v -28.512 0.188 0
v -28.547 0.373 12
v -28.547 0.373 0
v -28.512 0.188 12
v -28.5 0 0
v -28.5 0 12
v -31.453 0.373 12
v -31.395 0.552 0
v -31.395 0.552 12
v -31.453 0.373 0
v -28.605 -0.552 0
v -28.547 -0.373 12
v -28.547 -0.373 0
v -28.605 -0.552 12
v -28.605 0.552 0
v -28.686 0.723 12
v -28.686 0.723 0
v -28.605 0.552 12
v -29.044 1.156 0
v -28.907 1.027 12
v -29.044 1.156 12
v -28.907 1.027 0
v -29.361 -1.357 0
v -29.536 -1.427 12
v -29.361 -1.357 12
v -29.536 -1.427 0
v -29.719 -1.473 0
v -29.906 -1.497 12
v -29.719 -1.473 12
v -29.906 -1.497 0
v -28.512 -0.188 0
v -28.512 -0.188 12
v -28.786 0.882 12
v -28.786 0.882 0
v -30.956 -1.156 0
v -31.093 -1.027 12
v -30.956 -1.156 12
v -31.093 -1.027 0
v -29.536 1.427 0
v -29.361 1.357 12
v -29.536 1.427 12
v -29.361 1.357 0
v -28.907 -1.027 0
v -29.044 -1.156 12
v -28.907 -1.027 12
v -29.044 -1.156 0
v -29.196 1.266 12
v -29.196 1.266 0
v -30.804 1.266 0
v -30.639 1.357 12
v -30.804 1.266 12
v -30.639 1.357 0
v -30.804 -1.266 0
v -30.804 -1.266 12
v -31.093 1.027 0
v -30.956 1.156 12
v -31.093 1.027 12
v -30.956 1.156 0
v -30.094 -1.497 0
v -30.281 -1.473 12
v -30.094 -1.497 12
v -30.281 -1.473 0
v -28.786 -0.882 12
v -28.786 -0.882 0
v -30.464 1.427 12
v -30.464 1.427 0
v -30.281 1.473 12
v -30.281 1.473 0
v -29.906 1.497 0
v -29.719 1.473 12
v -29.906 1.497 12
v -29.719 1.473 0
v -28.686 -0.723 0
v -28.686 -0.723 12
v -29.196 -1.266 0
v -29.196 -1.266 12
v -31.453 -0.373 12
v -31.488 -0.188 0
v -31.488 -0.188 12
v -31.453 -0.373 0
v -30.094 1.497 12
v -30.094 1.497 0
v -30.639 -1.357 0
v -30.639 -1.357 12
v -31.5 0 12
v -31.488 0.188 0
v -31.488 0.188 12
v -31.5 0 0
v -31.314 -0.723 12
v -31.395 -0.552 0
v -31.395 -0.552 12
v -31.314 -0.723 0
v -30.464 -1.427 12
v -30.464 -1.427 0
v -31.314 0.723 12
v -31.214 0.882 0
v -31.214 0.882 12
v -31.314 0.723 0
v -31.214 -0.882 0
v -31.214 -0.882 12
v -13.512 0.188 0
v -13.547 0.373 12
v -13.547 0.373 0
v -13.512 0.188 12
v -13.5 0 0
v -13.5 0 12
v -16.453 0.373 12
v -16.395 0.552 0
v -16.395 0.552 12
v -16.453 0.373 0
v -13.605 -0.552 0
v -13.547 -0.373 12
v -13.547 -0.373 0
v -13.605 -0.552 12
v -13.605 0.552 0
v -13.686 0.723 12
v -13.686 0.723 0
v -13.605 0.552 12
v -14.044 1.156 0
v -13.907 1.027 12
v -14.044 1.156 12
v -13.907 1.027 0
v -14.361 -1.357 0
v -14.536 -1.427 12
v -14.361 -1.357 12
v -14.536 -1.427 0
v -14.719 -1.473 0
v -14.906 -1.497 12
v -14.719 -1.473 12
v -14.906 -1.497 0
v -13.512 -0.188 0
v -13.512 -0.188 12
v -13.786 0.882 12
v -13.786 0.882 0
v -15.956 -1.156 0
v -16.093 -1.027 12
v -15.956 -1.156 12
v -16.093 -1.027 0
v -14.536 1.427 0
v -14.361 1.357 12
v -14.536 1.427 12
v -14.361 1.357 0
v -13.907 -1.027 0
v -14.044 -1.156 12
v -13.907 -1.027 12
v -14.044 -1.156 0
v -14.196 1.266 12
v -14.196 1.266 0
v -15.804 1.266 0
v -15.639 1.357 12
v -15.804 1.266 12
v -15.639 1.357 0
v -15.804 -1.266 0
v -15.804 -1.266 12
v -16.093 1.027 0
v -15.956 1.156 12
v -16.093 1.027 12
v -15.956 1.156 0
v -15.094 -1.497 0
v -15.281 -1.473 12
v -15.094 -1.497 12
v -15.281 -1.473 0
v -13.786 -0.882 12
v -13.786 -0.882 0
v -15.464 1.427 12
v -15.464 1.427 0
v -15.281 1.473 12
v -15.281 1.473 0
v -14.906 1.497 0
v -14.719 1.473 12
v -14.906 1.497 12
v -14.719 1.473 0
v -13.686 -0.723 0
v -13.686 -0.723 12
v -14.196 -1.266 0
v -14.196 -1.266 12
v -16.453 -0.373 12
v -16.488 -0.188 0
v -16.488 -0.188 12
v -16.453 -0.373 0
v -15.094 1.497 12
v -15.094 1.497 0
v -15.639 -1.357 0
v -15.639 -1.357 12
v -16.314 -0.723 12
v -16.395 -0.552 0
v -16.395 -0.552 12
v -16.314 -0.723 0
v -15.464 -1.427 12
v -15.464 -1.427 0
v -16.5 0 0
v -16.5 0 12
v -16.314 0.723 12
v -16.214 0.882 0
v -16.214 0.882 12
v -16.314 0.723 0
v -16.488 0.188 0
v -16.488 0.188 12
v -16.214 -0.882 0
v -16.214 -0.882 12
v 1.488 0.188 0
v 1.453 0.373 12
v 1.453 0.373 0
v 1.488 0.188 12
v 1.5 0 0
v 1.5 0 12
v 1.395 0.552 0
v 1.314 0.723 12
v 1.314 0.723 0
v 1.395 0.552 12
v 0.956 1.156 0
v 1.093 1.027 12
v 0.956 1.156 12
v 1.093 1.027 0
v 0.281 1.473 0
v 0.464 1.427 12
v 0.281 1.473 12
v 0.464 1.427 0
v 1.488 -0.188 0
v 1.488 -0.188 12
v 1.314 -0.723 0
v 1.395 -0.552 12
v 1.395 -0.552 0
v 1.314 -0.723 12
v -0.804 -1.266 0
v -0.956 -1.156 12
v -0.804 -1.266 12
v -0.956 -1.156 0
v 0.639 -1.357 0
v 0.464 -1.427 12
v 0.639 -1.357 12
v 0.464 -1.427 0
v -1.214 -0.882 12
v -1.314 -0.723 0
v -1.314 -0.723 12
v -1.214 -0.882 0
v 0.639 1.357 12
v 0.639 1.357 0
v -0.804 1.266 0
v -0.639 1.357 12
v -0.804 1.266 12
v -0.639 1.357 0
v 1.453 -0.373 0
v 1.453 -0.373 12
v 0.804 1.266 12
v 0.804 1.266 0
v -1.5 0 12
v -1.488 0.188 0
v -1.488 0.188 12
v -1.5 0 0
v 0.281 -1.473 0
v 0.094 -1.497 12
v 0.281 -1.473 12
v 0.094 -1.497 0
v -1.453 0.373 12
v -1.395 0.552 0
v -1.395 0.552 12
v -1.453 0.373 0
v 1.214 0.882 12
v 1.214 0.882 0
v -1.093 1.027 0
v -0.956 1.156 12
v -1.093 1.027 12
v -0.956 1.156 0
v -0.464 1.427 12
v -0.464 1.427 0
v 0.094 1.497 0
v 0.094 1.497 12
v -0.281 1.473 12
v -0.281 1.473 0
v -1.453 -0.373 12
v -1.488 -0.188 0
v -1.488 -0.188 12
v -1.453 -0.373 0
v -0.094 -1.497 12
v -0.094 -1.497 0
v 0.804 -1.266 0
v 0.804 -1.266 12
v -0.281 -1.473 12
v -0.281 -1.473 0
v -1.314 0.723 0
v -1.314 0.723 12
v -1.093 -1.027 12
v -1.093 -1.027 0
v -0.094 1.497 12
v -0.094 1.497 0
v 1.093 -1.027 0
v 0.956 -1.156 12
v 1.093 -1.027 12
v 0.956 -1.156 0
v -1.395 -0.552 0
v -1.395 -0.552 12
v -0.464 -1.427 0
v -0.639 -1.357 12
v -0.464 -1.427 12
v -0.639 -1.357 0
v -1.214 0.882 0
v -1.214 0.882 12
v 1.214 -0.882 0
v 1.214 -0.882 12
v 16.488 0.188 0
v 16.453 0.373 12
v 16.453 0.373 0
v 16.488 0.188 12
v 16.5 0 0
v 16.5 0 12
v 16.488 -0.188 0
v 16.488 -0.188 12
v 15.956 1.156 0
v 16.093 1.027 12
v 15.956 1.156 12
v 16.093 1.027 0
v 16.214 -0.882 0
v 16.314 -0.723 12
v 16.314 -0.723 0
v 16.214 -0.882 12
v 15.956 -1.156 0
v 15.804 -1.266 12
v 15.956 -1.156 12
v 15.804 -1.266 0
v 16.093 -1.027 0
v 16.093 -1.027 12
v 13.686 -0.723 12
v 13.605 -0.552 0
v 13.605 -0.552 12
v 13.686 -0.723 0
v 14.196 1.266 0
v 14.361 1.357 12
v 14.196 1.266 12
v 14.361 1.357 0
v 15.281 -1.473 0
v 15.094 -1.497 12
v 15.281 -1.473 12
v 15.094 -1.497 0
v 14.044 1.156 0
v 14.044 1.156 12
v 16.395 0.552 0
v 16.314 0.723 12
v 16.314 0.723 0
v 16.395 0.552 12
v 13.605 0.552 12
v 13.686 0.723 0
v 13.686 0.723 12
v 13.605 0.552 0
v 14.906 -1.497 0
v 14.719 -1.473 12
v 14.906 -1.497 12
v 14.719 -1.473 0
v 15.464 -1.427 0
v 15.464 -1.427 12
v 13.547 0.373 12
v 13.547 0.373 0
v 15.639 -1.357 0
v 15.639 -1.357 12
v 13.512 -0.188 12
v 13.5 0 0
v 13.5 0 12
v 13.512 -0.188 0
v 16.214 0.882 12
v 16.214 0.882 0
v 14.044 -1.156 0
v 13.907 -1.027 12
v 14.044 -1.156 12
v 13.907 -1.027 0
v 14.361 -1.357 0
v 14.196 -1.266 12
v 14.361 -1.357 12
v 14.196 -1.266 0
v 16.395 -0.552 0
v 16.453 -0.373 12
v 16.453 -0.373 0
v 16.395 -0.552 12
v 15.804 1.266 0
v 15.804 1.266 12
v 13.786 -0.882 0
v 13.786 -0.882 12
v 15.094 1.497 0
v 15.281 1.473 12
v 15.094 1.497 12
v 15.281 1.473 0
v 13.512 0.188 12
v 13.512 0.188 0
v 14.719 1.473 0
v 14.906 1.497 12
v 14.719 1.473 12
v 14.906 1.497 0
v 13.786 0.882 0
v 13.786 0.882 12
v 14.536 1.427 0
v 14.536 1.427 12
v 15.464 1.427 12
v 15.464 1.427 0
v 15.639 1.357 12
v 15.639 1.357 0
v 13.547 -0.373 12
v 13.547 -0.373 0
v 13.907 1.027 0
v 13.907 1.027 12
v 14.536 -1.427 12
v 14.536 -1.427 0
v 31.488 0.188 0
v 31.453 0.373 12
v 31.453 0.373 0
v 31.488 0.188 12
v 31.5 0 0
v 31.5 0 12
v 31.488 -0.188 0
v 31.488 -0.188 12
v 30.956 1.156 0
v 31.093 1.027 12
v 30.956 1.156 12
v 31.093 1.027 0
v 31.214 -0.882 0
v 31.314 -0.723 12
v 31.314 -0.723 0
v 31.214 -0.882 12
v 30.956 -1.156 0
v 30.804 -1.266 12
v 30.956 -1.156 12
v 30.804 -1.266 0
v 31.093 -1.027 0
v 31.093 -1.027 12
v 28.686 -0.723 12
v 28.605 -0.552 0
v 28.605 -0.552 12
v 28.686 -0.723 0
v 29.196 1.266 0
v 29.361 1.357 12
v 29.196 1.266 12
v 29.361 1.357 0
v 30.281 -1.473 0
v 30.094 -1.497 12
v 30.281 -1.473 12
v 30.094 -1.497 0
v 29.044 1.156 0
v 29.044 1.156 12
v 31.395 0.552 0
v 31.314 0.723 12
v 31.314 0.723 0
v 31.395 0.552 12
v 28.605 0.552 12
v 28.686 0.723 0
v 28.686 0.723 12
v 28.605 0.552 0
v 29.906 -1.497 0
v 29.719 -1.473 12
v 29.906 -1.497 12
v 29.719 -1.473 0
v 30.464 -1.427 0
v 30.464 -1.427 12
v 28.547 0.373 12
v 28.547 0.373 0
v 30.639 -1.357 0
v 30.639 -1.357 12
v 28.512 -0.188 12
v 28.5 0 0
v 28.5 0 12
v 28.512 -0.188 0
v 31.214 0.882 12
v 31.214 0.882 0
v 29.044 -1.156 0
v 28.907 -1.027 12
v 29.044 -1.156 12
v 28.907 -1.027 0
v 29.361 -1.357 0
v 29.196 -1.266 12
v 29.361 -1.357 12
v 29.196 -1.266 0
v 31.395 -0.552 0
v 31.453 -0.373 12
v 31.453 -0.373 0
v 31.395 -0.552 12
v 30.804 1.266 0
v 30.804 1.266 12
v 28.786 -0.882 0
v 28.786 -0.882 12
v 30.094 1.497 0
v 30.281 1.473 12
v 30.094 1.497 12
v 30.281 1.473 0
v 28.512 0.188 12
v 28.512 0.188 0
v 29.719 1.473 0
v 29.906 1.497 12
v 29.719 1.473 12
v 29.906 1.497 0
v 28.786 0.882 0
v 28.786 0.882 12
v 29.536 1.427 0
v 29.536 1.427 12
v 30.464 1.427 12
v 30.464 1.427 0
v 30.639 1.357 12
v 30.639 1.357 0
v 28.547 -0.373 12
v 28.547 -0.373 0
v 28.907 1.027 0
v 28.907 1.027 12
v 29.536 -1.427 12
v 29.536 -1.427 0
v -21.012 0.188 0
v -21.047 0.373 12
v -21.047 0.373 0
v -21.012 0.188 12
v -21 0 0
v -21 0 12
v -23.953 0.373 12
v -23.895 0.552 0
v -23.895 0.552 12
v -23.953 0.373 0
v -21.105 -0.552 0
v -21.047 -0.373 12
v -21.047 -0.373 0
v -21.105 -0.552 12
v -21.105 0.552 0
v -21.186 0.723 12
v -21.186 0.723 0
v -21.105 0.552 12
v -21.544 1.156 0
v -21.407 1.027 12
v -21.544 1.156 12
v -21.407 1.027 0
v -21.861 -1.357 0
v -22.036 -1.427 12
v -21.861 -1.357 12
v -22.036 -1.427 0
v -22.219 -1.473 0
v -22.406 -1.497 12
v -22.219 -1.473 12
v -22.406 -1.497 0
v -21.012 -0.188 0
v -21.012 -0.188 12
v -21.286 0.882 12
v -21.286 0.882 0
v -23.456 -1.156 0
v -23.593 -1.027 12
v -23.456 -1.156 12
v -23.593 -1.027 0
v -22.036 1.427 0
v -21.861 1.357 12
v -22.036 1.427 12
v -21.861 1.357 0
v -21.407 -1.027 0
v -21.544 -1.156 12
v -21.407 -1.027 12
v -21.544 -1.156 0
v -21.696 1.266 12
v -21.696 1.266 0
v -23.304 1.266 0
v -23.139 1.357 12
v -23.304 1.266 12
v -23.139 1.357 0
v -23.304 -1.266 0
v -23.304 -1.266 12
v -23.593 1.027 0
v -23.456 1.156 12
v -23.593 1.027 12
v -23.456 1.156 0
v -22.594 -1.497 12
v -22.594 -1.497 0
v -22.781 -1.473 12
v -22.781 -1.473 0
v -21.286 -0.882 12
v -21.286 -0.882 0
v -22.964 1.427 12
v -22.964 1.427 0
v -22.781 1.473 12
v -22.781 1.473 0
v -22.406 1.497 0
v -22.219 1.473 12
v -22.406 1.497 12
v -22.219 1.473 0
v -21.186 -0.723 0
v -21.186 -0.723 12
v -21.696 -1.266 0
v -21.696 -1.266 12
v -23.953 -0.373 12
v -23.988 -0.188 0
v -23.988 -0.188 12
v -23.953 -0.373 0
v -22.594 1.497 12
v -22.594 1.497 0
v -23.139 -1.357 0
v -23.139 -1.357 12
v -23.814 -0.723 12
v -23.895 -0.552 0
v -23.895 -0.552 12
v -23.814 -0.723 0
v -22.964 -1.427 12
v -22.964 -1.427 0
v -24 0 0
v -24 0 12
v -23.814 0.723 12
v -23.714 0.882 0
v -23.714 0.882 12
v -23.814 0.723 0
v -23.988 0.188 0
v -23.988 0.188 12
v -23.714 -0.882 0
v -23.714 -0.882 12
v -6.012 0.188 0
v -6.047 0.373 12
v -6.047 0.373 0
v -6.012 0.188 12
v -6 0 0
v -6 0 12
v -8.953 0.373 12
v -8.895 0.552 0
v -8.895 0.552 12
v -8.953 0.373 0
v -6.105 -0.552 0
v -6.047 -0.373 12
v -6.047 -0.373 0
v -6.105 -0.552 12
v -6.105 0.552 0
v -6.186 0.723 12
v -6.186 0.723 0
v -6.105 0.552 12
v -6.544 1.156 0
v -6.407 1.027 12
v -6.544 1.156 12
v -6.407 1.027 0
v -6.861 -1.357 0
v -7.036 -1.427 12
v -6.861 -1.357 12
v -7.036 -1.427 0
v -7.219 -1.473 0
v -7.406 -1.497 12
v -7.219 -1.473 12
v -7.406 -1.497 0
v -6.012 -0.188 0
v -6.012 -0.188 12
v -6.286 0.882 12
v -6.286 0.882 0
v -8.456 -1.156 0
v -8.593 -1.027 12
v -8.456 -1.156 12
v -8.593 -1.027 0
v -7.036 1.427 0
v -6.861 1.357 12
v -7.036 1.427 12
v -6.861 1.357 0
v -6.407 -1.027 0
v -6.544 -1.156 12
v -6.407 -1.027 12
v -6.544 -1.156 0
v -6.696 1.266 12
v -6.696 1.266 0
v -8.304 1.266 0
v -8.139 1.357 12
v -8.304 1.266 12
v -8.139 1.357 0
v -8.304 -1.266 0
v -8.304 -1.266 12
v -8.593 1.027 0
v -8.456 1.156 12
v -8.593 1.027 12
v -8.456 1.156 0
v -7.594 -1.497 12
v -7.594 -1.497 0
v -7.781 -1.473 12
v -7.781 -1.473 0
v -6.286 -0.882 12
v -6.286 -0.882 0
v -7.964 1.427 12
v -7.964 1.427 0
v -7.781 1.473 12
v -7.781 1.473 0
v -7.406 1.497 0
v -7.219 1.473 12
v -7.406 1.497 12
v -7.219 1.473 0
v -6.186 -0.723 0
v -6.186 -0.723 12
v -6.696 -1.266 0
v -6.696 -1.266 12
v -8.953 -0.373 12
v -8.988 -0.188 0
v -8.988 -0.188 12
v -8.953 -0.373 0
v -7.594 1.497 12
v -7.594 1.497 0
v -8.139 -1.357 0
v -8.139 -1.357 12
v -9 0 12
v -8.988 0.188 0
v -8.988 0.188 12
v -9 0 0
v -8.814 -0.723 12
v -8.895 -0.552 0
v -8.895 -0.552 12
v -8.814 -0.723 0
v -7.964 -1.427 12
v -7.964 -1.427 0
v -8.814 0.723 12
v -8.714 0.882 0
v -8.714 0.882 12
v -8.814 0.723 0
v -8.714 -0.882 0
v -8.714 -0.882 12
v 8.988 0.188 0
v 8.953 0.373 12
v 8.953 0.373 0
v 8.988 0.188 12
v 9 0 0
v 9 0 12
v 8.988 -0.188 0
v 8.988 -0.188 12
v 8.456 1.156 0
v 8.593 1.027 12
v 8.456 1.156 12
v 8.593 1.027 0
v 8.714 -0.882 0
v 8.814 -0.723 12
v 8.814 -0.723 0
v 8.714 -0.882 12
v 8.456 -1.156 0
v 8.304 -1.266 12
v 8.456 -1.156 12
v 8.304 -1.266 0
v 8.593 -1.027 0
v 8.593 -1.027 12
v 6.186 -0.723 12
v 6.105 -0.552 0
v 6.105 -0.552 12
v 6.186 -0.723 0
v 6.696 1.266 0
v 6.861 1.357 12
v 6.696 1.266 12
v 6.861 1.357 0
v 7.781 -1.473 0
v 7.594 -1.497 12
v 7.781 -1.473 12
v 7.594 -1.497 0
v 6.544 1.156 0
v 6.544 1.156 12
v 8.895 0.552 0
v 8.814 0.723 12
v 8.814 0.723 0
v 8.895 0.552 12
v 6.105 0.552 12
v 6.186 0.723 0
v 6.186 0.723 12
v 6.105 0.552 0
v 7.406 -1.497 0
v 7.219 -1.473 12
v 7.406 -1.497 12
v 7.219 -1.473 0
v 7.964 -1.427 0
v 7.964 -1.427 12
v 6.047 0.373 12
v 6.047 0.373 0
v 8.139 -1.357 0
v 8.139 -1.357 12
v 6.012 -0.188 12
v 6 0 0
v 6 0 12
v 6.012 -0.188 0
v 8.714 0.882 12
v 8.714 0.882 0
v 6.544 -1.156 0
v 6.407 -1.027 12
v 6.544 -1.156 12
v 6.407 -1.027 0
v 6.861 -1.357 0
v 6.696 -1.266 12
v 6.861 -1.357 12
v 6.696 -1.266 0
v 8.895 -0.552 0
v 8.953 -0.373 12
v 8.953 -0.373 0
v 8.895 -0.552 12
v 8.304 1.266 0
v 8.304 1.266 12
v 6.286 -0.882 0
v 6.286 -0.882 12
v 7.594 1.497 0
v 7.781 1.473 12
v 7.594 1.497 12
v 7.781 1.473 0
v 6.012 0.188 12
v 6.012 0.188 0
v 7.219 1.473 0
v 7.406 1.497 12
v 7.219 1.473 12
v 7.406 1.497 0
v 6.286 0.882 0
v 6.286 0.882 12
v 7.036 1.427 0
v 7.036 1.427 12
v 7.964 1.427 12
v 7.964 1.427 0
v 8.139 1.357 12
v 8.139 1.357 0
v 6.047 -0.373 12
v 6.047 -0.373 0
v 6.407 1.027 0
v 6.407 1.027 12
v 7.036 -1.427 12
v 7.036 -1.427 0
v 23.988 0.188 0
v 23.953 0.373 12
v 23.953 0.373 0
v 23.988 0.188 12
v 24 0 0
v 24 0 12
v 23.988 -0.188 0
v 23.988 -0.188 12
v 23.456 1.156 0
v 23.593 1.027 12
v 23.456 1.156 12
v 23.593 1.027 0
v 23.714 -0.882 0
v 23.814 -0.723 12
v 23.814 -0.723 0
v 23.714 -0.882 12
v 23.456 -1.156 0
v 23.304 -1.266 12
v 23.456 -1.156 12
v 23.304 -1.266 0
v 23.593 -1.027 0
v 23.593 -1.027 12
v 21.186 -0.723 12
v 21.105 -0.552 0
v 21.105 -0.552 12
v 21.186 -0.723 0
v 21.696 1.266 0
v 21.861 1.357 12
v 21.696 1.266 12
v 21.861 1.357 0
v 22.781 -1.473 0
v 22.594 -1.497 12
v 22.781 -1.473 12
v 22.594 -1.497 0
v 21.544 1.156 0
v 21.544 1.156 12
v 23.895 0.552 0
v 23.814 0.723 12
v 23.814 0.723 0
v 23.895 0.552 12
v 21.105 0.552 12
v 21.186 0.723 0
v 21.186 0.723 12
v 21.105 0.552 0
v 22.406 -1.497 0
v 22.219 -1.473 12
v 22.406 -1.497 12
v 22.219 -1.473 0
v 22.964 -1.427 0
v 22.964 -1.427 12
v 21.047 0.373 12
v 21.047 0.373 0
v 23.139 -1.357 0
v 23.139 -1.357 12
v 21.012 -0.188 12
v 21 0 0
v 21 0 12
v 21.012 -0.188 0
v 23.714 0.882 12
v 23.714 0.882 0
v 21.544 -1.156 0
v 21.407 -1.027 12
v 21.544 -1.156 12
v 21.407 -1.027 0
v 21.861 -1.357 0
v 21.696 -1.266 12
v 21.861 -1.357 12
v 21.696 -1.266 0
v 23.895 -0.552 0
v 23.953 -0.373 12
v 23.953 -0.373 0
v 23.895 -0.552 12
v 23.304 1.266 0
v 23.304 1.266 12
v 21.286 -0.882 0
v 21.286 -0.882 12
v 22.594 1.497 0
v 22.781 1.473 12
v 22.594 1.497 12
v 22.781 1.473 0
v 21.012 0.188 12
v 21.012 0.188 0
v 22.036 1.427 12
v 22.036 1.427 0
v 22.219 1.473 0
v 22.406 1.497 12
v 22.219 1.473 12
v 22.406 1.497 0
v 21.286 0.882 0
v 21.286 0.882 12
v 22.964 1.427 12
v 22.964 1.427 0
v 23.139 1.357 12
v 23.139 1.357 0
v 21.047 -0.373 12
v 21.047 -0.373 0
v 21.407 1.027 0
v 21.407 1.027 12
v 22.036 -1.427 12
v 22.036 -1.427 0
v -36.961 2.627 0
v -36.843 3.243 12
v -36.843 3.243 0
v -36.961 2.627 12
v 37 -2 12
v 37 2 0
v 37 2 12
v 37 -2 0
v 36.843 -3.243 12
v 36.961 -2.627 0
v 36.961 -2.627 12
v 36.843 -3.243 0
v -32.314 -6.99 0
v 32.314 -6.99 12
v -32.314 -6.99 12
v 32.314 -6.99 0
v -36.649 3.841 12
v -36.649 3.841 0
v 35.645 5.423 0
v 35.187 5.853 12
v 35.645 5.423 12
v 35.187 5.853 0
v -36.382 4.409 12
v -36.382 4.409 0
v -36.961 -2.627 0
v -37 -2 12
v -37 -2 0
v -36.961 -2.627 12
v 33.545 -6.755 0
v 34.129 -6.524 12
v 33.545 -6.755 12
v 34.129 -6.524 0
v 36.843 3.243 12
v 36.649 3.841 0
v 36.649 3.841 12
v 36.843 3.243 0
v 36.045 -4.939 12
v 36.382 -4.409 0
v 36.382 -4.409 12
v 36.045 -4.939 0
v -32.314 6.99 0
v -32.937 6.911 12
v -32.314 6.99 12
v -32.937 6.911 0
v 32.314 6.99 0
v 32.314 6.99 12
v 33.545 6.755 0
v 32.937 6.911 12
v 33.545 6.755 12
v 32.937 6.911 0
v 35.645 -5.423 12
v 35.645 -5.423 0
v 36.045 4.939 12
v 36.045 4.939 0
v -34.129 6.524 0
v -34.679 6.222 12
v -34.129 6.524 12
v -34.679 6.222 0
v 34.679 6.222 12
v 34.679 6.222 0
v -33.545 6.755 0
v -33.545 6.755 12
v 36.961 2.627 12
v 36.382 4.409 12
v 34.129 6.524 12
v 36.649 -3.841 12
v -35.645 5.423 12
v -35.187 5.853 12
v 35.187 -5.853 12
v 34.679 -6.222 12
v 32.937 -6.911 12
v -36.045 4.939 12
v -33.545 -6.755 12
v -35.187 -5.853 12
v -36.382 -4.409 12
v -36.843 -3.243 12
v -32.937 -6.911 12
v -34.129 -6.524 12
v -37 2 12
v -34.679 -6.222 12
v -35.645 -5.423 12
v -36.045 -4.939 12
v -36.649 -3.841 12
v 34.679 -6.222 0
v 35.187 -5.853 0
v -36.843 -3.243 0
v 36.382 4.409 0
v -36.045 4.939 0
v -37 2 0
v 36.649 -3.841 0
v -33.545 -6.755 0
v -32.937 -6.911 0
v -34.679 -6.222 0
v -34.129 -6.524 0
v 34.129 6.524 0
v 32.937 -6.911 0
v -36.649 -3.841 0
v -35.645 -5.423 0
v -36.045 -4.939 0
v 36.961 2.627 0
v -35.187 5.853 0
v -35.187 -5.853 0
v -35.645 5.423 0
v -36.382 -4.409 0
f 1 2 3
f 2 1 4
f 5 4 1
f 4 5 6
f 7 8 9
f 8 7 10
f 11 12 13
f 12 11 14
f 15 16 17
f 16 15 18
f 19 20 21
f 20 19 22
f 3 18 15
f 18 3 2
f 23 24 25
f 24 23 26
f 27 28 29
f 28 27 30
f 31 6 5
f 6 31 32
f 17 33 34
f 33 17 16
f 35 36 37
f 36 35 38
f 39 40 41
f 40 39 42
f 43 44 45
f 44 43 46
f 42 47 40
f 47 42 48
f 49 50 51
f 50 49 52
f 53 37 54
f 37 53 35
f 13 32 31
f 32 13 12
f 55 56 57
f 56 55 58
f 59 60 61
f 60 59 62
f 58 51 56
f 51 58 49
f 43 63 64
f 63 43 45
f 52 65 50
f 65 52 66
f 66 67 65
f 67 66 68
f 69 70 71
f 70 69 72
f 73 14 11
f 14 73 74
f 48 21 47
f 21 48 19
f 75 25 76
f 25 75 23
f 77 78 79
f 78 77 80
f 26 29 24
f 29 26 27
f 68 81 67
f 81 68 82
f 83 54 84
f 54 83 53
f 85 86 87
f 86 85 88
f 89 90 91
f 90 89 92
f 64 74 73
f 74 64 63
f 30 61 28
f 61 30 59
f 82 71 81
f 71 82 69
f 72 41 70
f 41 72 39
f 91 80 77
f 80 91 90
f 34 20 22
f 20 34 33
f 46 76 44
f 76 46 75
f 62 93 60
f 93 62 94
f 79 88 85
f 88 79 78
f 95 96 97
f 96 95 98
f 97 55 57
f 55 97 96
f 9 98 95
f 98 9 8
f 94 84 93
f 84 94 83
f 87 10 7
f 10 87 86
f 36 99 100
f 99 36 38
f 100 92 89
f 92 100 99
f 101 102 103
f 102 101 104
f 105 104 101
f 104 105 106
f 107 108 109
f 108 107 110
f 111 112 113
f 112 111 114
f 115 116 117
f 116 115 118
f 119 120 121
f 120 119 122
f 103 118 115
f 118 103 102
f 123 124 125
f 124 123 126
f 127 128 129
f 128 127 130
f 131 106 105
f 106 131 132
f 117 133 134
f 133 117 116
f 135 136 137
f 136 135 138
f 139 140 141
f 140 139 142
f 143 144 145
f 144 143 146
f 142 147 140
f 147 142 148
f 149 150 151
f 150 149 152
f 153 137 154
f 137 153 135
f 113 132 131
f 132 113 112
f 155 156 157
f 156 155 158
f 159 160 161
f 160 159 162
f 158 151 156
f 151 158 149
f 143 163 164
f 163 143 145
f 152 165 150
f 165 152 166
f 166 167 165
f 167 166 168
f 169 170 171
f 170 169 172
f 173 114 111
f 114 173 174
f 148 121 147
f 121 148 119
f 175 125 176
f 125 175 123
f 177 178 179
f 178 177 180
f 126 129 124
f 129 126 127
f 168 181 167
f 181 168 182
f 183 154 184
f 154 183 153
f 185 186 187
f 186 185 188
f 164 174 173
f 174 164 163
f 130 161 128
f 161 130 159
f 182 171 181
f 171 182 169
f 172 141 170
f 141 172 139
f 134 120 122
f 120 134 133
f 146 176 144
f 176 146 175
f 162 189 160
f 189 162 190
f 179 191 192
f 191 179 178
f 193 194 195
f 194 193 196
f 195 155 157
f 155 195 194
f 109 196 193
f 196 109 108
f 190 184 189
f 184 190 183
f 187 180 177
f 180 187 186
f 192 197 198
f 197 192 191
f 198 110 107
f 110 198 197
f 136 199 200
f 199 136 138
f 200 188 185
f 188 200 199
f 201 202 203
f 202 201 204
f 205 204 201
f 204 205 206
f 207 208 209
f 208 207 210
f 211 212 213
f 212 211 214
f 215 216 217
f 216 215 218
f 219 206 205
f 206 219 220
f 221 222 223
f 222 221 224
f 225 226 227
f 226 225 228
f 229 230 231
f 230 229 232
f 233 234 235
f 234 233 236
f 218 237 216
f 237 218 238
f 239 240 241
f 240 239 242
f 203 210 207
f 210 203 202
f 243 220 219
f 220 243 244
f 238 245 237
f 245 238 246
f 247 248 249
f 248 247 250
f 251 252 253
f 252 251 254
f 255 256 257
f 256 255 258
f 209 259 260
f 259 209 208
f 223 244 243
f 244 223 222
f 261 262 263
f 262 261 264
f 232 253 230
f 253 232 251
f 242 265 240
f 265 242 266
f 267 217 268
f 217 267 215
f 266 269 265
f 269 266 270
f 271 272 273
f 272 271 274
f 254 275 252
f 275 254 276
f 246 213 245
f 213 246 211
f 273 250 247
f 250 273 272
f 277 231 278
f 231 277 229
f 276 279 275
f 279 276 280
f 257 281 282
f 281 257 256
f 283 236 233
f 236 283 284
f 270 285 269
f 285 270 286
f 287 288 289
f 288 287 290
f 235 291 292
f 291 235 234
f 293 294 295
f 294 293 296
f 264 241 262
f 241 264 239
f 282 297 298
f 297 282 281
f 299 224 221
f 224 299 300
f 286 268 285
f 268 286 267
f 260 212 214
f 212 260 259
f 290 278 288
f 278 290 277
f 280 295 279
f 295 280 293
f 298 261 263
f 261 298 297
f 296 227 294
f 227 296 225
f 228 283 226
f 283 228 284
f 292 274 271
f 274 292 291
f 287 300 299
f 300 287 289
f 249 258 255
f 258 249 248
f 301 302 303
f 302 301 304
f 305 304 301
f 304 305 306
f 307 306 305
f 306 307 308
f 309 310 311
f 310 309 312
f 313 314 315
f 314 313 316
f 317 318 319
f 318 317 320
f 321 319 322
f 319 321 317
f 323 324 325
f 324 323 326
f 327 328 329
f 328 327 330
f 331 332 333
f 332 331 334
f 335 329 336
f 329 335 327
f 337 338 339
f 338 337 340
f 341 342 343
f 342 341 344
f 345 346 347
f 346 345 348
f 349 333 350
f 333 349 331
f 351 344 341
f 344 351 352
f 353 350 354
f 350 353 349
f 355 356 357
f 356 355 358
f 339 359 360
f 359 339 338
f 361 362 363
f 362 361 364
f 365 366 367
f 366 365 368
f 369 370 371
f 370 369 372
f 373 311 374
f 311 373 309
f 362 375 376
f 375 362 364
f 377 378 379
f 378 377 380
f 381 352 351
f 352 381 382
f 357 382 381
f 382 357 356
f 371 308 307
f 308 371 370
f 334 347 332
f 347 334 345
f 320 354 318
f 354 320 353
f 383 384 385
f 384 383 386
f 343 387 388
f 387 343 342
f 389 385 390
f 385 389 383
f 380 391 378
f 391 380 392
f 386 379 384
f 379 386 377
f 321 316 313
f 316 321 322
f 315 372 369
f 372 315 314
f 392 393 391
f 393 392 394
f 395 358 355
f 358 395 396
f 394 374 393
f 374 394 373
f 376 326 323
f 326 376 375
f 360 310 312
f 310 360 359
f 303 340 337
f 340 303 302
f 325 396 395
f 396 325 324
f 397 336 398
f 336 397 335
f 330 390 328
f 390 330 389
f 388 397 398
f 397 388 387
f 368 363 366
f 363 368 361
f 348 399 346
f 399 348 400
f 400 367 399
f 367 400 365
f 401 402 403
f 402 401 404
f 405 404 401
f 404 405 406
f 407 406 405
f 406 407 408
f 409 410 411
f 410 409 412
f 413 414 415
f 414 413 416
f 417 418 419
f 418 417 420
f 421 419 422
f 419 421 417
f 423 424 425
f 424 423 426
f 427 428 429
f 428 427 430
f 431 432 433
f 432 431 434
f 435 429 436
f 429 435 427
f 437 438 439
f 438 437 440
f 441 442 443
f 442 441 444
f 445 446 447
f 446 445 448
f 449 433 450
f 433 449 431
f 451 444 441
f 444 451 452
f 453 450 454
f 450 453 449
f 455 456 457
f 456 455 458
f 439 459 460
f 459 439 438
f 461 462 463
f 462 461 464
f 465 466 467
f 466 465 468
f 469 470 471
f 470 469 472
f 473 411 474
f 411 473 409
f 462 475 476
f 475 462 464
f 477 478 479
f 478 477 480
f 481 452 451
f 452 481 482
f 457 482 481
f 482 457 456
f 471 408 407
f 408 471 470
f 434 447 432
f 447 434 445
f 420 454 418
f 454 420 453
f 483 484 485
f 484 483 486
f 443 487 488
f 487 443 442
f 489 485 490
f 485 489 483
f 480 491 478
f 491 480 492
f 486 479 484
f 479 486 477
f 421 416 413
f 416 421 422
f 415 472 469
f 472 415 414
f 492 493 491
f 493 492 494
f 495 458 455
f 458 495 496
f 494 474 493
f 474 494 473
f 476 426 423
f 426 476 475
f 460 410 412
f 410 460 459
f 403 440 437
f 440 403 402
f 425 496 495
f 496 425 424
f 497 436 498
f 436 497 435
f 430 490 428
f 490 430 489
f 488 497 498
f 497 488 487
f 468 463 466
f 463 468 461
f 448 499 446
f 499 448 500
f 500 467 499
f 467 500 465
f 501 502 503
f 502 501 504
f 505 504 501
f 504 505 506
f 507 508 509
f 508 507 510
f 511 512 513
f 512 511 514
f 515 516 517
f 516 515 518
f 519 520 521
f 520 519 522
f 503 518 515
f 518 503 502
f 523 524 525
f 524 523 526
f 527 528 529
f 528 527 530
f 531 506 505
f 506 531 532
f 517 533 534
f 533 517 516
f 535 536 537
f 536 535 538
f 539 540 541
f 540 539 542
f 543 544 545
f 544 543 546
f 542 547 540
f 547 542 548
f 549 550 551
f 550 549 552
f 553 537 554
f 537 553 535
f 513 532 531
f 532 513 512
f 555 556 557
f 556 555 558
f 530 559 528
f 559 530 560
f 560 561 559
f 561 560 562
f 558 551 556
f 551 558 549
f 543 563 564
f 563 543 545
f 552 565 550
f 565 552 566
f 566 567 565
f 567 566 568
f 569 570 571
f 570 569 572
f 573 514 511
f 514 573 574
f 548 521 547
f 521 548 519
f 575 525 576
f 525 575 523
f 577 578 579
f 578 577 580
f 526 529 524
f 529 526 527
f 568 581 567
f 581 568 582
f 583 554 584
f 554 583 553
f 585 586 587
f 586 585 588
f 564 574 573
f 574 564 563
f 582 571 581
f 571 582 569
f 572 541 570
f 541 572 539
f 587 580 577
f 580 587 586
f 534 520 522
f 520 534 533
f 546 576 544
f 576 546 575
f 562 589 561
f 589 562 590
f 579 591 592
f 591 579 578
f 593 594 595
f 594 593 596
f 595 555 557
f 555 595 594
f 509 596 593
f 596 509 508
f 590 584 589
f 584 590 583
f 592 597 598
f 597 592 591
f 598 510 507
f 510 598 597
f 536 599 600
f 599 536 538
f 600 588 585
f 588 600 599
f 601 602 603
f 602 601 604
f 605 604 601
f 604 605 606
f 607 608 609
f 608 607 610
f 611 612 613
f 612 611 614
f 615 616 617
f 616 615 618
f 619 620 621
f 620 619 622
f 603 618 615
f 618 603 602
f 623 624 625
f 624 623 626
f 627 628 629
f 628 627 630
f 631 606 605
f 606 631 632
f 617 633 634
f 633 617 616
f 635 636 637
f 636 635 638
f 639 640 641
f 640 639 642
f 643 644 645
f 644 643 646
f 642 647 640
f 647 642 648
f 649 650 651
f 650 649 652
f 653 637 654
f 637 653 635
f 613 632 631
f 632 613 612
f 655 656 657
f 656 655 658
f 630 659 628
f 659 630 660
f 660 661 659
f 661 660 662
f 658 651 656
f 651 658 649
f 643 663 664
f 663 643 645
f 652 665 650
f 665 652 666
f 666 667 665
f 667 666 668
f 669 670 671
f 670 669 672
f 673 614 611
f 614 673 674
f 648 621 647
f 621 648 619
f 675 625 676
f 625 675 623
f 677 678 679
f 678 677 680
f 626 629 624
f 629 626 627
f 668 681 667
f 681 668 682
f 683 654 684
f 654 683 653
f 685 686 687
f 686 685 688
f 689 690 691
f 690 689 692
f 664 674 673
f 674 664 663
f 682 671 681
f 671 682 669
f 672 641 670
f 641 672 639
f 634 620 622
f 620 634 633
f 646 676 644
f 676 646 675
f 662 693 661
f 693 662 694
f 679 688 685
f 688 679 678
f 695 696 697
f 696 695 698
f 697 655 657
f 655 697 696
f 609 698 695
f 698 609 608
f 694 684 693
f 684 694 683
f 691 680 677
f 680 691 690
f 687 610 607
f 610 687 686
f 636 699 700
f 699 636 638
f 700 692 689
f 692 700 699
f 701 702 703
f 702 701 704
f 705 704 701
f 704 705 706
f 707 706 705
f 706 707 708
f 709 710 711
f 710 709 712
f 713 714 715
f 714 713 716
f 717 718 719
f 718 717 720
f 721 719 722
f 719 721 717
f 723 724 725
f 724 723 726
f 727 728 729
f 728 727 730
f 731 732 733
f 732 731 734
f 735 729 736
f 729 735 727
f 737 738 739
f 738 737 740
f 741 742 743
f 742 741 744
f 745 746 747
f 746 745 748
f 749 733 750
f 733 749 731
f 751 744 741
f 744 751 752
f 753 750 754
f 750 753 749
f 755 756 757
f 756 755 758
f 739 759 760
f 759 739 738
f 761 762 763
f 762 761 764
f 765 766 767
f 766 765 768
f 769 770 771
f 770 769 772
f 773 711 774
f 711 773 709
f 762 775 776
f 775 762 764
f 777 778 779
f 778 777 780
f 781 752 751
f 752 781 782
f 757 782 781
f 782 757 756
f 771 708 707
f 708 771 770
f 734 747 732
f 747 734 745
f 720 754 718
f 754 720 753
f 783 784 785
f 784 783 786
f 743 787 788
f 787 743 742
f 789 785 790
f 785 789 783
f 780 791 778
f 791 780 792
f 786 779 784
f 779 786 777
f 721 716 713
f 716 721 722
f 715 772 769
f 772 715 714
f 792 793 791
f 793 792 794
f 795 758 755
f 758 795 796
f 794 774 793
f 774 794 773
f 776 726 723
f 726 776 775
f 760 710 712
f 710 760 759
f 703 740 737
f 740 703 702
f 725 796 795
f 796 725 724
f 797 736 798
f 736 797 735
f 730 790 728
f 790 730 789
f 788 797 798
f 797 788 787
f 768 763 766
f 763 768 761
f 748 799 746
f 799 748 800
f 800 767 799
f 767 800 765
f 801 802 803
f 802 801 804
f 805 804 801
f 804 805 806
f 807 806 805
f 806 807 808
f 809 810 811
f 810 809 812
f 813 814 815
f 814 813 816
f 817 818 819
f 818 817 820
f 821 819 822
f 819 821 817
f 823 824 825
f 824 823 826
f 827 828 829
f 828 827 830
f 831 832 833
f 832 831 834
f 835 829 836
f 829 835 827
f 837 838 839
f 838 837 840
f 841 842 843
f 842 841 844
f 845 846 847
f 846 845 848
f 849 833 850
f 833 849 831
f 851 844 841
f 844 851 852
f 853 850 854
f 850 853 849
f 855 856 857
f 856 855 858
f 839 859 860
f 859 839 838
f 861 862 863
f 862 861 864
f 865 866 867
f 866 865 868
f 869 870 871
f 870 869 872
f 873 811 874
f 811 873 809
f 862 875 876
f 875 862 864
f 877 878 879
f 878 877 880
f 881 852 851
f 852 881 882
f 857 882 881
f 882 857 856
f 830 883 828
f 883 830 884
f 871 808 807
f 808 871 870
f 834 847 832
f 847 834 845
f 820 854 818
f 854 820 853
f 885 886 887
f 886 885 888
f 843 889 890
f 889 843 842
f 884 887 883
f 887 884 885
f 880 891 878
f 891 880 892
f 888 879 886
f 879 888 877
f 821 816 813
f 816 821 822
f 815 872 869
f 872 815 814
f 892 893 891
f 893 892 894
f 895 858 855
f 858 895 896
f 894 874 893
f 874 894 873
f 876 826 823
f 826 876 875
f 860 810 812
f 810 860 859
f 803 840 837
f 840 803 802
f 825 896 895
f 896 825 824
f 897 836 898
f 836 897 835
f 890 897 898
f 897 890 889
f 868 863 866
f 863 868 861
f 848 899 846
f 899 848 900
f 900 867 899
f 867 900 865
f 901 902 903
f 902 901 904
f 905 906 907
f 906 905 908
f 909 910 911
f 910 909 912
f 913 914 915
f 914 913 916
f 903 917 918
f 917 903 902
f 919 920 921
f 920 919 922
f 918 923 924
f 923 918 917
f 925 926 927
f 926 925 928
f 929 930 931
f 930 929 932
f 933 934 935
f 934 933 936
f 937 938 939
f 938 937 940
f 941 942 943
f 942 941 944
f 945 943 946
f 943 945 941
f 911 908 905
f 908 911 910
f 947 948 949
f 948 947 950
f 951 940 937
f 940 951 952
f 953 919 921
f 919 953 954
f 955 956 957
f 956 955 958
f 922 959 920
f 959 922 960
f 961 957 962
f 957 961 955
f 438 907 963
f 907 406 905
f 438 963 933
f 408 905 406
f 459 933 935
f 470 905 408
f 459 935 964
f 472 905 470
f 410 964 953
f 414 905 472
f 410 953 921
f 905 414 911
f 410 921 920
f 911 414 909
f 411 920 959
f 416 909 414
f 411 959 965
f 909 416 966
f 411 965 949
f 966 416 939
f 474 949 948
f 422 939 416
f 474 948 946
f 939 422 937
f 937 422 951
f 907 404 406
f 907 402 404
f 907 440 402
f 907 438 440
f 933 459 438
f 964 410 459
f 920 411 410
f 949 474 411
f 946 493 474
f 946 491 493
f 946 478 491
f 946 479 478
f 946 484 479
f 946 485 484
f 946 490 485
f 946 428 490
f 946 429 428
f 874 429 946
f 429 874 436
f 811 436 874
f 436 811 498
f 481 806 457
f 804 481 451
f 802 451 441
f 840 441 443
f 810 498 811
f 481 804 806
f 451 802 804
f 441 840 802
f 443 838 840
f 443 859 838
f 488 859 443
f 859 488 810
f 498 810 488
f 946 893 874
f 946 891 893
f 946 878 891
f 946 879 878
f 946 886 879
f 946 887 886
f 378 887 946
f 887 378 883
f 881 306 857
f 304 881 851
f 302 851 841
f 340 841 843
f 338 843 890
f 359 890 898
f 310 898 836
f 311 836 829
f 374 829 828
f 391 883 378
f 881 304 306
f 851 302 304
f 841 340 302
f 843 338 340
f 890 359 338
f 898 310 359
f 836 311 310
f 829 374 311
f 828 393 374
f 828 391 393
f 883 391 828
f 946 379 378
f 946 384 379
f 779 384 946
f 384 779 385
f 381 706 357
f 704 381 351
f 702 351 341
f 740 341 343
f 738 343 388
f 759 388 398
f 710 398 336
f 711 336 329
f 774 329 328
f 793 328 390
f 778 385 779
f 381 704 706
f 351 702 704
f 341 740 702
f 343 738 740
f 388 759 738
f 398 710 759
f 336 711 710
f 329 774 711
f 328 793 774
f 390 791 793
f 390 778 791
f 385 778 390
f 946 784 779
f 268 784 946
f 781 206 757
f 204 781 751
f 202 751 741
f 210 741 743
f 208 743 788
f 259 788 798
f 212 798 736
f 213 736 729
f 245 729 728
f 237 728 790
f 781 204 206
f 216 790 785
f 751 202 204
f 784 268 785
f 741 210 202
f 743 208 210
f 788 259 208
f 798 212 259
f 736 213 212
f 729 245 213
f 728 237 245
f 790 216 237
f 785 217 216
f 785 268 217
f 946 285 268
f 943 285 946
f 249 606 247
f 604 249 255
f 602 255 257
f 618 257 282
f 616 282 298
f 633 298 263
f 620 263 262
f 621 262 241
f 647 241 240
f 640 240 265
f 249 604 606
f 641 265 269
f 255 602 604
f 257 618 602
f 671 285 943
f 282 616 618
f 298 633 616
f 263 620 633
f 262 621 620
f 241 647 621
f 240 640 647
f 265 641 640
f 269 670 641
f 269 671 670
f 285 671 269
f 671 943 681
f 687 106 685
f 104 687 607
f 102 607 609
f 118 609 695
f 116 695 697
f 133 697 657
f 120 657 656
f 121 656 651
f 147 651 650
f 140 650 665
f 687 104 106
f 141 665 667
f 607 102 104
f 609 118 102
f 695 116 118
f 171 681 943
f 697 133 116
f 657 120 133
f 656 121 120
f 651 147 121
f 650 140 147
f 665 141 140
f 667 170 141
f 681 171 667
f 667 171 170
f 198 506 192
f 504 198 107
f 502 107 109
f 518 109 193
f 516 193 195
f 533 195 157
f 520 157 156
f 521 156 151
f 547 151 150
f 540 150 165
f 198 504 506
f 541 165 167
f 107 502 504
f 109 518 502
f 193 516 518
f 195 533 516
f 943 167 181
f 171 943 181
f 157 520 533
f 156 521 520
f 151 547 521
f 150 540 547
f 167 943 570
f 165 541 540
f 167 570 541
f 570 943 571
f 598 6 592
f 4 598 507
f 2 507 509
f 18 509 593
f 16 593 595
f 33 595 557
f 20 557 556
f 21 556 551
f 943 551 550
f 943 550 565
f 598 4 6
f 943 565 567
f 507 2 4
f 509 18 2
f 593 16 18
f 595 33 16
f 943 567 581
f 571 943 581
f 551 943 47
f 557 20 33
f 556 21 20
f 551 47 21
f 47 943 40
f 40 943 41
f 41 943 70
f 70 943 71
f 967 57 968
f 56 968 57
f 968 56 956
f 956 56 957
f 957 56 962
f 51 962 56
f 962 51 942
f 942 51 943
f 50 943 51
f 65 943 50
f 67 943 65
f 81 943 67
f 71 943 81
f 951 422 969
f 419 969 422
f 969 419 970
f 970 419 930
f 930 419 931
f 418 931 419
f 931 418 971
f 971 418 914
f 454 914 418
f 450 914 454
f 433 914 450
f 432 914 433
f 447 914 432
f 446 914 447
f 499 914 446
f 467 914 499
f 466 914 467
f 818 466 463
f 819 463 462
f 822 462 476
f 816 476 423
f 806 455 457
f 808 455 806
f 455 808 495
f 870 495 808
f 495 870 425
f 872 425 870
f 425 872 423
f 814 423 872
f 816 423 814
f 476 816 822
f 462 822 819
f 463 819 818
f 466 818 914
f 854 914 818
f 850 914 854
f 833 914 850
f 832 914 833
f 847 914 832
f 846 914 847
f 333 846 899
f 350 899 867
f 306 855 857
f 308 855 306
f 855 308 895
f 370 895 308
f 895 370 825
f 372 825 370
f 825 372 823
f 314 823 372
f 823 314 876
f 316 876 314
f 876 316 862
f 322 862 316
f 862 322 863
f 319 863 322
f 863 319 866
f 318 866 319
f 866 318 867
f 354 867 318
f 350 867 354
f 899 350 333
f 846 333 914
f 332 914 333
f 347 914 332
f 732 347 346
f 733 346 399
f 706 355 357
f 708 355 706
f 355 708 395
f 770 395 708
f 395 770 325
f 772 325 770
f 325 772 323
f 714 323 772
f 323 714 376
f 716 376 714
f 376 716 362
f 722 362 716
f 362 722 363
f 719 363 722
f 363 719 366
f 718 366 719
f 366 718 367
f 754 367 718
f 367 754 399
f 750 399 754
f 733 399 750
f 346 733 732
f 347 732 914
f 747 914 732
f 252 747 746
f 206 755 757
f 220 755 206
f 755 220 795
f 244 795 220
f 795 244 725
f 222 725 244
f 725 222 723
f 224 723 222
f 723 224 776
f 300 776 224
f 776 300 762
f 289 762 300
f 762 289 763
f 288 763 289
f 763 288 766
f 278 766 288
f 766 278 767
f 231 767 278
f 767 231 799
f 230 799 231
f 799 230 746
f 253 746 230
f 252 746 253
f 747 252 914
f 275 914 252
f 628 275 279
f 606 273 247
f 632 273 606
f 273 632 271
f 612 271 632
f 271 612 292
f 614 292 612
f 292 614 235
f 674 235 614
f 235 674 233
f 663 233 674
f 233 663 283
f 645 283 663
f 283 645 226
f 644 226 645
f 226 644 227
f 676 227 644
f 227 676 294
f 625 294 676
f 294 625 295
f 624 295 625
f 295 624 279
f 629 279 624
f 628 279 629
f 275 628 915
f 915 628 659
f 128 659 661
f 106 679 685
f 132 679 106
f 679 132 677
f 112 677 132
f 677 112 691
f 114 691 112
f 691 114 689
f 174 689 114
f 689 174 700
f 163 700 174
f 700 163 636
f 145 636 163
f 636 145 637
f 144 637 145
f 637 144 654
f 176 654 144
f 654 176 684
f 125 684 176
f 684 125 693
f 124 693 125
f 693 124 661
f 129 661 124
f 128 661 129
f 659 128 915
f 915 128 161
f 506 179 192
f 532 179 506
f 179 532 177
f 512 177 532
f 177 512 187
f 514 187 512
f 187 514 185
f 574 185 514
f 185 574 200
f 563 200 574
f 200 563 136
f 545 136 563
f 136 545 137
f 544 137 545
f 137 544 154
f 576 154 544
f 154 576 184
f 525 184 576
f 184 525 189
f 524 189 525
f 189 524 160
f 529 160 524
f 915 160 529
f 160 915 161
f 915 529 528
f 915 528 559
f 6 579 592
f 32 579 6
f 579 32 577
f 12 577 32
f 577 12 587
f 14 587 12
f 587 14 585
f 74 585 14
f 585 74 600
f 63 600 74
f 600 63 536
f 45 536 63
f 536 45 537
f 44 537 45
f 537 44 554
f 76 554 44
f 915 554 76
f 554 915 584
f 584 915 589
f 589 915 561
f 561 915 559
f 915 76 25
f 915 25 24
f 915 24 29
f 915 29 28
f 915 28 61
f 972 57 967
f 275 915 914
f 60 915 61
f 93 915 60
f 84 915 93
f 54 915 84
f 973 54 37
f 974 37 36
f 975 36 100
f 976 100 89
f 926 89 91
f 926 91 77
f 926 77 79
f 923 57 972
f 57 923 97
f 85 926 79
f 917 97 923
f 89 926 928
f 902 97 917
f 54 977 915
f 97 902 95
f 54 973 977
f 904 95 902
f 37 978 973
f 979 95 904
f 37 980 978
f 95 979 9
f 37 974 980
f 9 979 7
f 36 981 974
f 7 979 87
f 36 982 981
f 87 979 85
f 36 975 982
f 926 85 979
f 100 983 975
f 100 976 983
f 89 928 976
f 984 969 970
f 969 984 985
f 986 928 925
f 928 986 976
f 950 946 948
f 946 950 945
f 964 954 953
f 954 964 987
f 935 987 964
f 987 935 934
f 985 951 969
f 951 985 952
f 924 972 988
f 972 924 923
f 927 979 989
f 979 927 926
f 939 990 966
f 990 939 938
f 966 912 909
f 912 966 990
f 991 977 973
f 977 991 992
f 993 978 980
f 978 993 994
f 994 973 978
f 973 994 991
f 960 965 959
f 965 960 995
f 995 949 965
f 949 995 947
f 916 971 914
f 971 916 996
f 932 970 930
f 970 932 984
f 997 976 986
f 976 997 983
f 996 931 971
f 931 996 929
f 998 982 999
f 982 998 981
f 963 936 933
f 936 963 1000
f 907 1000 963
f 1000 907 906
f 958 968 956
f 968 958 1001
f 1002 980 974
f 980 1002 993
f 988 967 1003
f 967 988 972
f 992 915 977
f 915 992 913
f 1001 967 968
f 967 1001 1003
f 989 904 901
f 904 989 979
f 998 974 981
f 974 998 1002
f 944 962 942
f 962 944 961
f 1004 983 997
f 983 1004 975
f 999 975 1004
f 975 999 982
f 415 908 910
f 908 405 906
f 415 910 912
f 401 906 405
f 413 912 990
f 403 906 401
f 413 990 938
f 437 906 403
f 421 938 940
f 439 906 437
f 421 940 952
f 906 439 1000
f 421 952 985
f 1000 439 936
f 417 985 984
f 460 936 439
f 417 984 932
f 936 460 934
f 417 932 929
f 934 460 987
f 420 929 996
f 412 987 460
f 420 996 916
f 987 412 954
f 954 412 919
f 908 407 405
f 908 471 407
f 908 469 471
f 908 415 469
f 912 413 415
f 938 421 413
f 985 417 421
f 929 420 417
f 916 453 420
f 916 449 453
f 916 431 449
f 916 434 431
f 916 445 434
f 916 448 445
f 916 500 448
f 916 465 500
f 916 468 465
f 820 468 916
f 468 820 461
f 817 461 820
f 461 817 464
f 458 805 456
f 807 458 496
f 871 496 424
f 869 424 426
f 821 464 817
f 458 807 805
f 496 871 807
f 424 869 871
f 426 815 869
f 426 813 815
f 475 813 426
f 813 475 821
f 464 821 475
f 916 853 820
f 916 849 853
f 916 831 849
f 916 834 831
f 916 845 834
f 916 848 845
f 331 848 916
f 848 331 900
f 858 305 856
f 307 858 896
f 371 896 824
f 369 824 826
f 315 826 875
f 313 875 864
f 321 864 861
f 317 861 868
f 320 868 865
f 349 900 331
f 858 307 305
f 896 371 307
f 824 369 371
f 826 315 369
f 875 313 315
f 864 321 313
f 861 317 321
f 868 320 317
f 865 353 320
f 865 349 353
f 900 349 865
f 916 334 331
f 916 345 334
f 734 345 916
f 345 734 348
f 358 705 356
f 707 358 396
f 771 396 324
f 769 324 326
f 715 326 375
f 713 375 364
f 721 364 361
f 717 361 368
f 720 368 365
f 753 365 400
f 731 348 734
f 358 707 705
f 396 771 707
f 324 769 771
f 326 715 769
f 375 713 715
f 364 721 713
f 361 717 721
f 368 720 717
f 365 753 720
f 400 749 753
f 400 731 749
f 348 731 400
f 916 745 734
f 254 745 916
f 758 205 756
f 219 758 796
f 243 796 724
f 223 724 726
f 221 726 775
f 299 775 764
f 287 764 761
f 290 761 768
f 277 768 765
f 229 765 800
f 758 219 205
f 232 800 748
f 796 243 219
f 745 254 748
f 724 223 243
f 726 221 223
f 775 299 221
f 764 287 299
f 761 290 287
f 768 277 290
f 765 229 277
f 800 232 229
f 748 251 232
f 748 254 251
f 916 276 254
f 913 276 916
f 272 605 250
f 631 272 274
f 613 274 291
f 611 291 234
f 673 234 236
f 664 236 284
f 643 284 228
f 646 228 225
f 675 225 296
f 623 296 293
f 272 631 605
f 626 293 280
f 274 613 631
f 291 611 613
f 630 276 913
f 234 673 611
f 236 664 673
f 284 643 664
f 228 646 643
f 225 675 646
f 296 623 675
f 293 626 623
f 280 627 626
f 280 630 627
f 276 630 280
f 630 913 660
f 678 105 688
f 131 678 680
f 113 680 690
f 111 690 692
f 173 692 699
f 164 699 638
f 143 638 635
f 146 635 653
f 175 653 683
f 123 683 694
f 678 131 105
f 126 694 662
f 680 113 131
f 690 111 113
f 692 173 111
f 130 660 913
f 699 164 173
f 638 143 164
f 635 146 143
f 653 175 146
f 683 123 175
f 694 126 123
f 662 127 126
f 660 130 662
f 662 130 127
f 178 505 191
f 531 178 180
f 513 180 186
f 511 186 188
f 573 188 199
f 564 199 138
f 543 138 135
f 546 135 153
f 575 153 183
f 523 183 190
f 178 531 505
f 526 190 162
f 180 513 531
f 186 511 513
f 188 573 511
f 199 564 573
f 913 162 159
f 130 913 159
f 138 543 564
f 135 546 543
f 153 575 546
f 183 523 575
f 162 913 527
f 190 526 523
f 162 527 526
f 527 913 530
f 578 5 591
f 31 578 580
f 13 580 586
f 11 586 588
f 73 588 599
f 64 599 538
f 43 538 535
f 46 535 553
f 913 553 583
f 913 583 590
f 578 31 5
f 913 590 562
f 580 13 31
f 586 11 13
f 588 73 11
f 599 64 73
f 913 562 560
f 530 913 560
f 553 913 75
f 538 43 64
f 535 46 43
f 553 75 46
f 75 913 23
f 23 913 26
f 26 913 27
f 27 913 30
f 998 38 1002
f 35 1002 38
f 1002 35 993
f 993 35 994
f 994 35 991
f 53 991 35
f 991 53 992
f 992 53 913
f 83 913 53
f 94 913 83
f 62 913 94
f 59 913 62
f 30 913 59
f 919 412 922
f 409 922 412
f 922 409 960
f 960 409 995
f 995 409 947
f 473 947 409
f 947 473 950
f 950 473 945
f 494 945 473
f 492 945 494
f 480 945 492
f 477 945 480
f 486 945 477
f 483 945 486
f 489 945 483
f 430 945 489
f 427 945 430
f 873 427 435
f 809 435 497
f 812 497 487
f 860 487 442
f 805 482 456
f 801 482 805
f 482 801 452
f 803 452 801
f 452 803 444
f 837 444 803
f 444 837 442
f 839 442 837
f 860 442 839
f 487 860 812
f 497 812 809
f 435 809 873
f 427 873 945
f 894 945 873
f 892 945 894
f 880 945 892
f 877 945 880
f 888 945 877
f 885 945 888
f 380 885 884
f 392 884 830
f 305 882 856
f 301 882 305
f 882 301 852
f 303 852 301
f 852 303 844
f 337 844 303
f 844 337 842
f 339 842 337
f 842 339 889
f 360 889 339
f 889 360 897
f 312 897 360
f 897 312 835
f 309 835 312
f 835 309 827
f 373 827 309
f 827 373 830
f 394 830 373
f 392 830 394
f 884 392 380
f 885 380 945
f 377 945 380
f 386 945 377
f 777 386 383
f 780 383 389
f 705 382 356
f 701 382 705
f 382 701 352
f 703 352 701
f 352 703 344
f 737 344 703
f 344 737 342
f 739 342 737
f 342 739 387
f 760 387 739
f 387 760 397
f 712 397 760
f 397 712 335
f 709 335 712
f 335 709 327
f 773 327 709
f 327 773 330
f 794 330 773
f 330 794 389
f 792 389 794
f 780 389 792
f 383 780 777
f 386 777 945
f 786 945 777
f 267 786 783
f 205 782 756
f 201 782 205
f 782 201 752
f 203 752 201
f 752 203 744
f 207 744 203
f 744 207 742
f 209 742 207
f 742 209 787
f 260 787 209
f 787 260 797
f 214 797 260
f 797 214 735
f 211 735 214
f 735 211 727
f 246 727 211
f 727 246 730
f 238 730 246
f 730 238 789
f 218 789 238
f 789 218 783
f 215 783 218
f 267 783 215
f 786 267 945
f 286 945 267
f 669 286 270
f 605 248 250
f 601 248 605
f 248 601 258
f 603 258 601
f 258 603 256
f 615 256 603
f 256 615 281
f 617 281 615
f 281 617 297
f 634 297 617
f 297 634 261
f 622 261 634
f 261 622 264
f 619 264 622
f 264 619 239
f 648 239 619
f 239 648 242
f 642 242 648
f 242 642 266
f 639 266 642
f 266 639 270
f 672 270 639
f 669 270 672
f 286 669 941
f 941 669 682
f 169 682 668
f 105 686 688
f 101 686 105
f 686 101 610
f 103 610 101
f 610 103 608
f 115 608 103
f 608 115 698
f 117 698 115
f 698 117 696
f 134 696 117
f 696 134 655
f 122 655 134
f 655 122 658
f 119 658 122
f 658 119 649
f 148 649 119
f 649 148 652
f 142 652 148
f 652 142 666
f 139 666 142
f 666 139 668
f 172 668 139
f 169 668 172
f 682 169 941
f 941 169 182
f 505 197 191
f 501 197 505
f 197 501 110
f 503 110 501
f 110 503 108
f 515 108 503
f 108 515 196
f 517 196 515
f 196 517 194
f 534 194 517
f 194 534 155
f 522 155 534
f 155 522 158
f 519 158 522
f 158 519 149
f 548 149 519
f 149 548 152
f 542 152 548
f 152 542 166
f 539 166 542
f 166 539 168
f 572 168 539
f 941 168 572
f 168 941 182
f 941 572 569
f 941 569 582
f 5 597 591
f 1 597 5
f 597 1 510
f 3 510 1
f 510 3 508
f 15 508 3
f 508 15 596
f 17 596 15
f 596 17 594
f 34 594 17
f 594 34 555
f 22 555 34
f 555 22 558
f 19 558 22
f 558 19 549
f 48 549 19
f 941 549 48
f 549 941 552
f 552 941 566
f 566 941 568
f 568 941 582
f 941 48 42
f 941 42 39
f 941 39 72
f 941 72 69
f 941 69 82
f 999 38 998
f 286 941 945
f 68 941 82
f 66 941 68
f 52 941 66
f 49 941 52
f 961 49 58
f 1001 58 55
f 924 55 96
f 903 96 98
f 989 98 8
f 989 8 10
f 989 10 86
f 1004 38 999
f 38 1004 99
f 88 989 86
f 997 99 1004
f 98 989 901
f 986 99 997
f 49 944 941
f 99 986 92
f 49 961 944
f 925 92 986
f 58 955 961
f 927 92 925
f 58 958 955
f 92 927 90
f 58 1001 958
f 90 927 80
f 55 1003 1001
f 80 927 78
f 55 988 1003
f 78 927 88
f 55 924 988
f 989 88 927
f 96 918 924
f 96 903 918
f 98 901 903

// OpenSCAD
$fn = 50;


difference() {
	union() {
		hull() {
			translate(v = [-32.0000000000, 2.0000000000, 0]) {
				cylinder(h = 12, r = 5);
			}
			translate(v = [32.0000000000, 2.0000000000, 0]) {
				cylinder(h = 12, r = 5);
			}
			translate(v = [-32.0000000000, -2.0000000000, 0]) {
				cylinder(h = 12, r = 5);
			}
			translate(v = [32.0000000000, -2.0000000000, 0]) {
				cylinder(h = 12, r = 5);
			}
		}
	}
	union() {
		translate(v = [-30.0000000000, 0.0000000000, 0]) {
			translate(v = [0, 0, -100]) {
				cylinder(h = 200, r = 1.5000000000);
			}
		}
		translate(v = [-15.0000000000, 0.0000000000, 0]) {
			translate(v = [0, 0, -100]) {
				cylinder(h = 200, r = 1.5000000000);
			}
		}
		translate(v = [0, 0, -100]) {
			cylinder(h = 200, r = 1.5000000000);
		}
		translate(v = [15.0000000000, 0.0000000000, 0]) {
			translate(v = [0, 0, -100]) {
				cylinder(h = 200, r = 1.5000000000);
			}
		}
		translate(v = [30.0000000000, 0.0000000000, 0]) {
			translate(v = [0, 0, -100]) {
				cylinder(h = 200, r = 1.5000000000);
			}
		}
		translate(v = [-30.0000000000, 0.0000000000, 0]) {
			translate(v = [0, 0, -100]) {
				cylinder(h = 200, r = 1.5000000000);
			}
		}
		translate(v = [-22.5000000000, 0.0000000000, 0]) {
			translate(v = [0, 0, -100]) {
				cylinder(h = 200, r = 1.5000000000);
			}
		}
		translate(v = [-15.0000000000, 0.0000000000, 0]) {
			translate(v = [0, 0, -100]) {
				cylinder(h = 200, r = 1.5000000000);
			}
		}
		translate(v = [-7.5000000000, 0.0000000000, 0]) {
			translate(v = [0, 0, -100]) {
				cylinder(h = 200, r = 1.5000000000);
			}
		}
		translate(v = [0, 0, -100]) {
			cylinder(h = 200, r = 1.5000000000);
		}
		translate(v = [7.5000000000, 0.0000000000, 0]) {
			translate(v = [0, 0, -100]) {
				cylinder(h = 200, r = 1.5000000000);
			}
		}
		translate(v = [15.0000000000, 0.0000000000, 0]) {
			translate(v = [0, 0, -100]) {
				cylinder(h = 200, r = 1.5000000000);
			}
		}
		translate(v = [22.5000000000, 0.0000000000, 0]) {
			translate(v = [0, 0, -100]) {
				cylinder(h = 200, r = 1.5000000000);
			}
		}
		translate(v = [30.0000000000, 0.0000000000, 0]) {
			translate(v = [0, 0, -100]) {
				cylinder(h = 200, r = 1.5000000000);
			}
		}
	}
}
